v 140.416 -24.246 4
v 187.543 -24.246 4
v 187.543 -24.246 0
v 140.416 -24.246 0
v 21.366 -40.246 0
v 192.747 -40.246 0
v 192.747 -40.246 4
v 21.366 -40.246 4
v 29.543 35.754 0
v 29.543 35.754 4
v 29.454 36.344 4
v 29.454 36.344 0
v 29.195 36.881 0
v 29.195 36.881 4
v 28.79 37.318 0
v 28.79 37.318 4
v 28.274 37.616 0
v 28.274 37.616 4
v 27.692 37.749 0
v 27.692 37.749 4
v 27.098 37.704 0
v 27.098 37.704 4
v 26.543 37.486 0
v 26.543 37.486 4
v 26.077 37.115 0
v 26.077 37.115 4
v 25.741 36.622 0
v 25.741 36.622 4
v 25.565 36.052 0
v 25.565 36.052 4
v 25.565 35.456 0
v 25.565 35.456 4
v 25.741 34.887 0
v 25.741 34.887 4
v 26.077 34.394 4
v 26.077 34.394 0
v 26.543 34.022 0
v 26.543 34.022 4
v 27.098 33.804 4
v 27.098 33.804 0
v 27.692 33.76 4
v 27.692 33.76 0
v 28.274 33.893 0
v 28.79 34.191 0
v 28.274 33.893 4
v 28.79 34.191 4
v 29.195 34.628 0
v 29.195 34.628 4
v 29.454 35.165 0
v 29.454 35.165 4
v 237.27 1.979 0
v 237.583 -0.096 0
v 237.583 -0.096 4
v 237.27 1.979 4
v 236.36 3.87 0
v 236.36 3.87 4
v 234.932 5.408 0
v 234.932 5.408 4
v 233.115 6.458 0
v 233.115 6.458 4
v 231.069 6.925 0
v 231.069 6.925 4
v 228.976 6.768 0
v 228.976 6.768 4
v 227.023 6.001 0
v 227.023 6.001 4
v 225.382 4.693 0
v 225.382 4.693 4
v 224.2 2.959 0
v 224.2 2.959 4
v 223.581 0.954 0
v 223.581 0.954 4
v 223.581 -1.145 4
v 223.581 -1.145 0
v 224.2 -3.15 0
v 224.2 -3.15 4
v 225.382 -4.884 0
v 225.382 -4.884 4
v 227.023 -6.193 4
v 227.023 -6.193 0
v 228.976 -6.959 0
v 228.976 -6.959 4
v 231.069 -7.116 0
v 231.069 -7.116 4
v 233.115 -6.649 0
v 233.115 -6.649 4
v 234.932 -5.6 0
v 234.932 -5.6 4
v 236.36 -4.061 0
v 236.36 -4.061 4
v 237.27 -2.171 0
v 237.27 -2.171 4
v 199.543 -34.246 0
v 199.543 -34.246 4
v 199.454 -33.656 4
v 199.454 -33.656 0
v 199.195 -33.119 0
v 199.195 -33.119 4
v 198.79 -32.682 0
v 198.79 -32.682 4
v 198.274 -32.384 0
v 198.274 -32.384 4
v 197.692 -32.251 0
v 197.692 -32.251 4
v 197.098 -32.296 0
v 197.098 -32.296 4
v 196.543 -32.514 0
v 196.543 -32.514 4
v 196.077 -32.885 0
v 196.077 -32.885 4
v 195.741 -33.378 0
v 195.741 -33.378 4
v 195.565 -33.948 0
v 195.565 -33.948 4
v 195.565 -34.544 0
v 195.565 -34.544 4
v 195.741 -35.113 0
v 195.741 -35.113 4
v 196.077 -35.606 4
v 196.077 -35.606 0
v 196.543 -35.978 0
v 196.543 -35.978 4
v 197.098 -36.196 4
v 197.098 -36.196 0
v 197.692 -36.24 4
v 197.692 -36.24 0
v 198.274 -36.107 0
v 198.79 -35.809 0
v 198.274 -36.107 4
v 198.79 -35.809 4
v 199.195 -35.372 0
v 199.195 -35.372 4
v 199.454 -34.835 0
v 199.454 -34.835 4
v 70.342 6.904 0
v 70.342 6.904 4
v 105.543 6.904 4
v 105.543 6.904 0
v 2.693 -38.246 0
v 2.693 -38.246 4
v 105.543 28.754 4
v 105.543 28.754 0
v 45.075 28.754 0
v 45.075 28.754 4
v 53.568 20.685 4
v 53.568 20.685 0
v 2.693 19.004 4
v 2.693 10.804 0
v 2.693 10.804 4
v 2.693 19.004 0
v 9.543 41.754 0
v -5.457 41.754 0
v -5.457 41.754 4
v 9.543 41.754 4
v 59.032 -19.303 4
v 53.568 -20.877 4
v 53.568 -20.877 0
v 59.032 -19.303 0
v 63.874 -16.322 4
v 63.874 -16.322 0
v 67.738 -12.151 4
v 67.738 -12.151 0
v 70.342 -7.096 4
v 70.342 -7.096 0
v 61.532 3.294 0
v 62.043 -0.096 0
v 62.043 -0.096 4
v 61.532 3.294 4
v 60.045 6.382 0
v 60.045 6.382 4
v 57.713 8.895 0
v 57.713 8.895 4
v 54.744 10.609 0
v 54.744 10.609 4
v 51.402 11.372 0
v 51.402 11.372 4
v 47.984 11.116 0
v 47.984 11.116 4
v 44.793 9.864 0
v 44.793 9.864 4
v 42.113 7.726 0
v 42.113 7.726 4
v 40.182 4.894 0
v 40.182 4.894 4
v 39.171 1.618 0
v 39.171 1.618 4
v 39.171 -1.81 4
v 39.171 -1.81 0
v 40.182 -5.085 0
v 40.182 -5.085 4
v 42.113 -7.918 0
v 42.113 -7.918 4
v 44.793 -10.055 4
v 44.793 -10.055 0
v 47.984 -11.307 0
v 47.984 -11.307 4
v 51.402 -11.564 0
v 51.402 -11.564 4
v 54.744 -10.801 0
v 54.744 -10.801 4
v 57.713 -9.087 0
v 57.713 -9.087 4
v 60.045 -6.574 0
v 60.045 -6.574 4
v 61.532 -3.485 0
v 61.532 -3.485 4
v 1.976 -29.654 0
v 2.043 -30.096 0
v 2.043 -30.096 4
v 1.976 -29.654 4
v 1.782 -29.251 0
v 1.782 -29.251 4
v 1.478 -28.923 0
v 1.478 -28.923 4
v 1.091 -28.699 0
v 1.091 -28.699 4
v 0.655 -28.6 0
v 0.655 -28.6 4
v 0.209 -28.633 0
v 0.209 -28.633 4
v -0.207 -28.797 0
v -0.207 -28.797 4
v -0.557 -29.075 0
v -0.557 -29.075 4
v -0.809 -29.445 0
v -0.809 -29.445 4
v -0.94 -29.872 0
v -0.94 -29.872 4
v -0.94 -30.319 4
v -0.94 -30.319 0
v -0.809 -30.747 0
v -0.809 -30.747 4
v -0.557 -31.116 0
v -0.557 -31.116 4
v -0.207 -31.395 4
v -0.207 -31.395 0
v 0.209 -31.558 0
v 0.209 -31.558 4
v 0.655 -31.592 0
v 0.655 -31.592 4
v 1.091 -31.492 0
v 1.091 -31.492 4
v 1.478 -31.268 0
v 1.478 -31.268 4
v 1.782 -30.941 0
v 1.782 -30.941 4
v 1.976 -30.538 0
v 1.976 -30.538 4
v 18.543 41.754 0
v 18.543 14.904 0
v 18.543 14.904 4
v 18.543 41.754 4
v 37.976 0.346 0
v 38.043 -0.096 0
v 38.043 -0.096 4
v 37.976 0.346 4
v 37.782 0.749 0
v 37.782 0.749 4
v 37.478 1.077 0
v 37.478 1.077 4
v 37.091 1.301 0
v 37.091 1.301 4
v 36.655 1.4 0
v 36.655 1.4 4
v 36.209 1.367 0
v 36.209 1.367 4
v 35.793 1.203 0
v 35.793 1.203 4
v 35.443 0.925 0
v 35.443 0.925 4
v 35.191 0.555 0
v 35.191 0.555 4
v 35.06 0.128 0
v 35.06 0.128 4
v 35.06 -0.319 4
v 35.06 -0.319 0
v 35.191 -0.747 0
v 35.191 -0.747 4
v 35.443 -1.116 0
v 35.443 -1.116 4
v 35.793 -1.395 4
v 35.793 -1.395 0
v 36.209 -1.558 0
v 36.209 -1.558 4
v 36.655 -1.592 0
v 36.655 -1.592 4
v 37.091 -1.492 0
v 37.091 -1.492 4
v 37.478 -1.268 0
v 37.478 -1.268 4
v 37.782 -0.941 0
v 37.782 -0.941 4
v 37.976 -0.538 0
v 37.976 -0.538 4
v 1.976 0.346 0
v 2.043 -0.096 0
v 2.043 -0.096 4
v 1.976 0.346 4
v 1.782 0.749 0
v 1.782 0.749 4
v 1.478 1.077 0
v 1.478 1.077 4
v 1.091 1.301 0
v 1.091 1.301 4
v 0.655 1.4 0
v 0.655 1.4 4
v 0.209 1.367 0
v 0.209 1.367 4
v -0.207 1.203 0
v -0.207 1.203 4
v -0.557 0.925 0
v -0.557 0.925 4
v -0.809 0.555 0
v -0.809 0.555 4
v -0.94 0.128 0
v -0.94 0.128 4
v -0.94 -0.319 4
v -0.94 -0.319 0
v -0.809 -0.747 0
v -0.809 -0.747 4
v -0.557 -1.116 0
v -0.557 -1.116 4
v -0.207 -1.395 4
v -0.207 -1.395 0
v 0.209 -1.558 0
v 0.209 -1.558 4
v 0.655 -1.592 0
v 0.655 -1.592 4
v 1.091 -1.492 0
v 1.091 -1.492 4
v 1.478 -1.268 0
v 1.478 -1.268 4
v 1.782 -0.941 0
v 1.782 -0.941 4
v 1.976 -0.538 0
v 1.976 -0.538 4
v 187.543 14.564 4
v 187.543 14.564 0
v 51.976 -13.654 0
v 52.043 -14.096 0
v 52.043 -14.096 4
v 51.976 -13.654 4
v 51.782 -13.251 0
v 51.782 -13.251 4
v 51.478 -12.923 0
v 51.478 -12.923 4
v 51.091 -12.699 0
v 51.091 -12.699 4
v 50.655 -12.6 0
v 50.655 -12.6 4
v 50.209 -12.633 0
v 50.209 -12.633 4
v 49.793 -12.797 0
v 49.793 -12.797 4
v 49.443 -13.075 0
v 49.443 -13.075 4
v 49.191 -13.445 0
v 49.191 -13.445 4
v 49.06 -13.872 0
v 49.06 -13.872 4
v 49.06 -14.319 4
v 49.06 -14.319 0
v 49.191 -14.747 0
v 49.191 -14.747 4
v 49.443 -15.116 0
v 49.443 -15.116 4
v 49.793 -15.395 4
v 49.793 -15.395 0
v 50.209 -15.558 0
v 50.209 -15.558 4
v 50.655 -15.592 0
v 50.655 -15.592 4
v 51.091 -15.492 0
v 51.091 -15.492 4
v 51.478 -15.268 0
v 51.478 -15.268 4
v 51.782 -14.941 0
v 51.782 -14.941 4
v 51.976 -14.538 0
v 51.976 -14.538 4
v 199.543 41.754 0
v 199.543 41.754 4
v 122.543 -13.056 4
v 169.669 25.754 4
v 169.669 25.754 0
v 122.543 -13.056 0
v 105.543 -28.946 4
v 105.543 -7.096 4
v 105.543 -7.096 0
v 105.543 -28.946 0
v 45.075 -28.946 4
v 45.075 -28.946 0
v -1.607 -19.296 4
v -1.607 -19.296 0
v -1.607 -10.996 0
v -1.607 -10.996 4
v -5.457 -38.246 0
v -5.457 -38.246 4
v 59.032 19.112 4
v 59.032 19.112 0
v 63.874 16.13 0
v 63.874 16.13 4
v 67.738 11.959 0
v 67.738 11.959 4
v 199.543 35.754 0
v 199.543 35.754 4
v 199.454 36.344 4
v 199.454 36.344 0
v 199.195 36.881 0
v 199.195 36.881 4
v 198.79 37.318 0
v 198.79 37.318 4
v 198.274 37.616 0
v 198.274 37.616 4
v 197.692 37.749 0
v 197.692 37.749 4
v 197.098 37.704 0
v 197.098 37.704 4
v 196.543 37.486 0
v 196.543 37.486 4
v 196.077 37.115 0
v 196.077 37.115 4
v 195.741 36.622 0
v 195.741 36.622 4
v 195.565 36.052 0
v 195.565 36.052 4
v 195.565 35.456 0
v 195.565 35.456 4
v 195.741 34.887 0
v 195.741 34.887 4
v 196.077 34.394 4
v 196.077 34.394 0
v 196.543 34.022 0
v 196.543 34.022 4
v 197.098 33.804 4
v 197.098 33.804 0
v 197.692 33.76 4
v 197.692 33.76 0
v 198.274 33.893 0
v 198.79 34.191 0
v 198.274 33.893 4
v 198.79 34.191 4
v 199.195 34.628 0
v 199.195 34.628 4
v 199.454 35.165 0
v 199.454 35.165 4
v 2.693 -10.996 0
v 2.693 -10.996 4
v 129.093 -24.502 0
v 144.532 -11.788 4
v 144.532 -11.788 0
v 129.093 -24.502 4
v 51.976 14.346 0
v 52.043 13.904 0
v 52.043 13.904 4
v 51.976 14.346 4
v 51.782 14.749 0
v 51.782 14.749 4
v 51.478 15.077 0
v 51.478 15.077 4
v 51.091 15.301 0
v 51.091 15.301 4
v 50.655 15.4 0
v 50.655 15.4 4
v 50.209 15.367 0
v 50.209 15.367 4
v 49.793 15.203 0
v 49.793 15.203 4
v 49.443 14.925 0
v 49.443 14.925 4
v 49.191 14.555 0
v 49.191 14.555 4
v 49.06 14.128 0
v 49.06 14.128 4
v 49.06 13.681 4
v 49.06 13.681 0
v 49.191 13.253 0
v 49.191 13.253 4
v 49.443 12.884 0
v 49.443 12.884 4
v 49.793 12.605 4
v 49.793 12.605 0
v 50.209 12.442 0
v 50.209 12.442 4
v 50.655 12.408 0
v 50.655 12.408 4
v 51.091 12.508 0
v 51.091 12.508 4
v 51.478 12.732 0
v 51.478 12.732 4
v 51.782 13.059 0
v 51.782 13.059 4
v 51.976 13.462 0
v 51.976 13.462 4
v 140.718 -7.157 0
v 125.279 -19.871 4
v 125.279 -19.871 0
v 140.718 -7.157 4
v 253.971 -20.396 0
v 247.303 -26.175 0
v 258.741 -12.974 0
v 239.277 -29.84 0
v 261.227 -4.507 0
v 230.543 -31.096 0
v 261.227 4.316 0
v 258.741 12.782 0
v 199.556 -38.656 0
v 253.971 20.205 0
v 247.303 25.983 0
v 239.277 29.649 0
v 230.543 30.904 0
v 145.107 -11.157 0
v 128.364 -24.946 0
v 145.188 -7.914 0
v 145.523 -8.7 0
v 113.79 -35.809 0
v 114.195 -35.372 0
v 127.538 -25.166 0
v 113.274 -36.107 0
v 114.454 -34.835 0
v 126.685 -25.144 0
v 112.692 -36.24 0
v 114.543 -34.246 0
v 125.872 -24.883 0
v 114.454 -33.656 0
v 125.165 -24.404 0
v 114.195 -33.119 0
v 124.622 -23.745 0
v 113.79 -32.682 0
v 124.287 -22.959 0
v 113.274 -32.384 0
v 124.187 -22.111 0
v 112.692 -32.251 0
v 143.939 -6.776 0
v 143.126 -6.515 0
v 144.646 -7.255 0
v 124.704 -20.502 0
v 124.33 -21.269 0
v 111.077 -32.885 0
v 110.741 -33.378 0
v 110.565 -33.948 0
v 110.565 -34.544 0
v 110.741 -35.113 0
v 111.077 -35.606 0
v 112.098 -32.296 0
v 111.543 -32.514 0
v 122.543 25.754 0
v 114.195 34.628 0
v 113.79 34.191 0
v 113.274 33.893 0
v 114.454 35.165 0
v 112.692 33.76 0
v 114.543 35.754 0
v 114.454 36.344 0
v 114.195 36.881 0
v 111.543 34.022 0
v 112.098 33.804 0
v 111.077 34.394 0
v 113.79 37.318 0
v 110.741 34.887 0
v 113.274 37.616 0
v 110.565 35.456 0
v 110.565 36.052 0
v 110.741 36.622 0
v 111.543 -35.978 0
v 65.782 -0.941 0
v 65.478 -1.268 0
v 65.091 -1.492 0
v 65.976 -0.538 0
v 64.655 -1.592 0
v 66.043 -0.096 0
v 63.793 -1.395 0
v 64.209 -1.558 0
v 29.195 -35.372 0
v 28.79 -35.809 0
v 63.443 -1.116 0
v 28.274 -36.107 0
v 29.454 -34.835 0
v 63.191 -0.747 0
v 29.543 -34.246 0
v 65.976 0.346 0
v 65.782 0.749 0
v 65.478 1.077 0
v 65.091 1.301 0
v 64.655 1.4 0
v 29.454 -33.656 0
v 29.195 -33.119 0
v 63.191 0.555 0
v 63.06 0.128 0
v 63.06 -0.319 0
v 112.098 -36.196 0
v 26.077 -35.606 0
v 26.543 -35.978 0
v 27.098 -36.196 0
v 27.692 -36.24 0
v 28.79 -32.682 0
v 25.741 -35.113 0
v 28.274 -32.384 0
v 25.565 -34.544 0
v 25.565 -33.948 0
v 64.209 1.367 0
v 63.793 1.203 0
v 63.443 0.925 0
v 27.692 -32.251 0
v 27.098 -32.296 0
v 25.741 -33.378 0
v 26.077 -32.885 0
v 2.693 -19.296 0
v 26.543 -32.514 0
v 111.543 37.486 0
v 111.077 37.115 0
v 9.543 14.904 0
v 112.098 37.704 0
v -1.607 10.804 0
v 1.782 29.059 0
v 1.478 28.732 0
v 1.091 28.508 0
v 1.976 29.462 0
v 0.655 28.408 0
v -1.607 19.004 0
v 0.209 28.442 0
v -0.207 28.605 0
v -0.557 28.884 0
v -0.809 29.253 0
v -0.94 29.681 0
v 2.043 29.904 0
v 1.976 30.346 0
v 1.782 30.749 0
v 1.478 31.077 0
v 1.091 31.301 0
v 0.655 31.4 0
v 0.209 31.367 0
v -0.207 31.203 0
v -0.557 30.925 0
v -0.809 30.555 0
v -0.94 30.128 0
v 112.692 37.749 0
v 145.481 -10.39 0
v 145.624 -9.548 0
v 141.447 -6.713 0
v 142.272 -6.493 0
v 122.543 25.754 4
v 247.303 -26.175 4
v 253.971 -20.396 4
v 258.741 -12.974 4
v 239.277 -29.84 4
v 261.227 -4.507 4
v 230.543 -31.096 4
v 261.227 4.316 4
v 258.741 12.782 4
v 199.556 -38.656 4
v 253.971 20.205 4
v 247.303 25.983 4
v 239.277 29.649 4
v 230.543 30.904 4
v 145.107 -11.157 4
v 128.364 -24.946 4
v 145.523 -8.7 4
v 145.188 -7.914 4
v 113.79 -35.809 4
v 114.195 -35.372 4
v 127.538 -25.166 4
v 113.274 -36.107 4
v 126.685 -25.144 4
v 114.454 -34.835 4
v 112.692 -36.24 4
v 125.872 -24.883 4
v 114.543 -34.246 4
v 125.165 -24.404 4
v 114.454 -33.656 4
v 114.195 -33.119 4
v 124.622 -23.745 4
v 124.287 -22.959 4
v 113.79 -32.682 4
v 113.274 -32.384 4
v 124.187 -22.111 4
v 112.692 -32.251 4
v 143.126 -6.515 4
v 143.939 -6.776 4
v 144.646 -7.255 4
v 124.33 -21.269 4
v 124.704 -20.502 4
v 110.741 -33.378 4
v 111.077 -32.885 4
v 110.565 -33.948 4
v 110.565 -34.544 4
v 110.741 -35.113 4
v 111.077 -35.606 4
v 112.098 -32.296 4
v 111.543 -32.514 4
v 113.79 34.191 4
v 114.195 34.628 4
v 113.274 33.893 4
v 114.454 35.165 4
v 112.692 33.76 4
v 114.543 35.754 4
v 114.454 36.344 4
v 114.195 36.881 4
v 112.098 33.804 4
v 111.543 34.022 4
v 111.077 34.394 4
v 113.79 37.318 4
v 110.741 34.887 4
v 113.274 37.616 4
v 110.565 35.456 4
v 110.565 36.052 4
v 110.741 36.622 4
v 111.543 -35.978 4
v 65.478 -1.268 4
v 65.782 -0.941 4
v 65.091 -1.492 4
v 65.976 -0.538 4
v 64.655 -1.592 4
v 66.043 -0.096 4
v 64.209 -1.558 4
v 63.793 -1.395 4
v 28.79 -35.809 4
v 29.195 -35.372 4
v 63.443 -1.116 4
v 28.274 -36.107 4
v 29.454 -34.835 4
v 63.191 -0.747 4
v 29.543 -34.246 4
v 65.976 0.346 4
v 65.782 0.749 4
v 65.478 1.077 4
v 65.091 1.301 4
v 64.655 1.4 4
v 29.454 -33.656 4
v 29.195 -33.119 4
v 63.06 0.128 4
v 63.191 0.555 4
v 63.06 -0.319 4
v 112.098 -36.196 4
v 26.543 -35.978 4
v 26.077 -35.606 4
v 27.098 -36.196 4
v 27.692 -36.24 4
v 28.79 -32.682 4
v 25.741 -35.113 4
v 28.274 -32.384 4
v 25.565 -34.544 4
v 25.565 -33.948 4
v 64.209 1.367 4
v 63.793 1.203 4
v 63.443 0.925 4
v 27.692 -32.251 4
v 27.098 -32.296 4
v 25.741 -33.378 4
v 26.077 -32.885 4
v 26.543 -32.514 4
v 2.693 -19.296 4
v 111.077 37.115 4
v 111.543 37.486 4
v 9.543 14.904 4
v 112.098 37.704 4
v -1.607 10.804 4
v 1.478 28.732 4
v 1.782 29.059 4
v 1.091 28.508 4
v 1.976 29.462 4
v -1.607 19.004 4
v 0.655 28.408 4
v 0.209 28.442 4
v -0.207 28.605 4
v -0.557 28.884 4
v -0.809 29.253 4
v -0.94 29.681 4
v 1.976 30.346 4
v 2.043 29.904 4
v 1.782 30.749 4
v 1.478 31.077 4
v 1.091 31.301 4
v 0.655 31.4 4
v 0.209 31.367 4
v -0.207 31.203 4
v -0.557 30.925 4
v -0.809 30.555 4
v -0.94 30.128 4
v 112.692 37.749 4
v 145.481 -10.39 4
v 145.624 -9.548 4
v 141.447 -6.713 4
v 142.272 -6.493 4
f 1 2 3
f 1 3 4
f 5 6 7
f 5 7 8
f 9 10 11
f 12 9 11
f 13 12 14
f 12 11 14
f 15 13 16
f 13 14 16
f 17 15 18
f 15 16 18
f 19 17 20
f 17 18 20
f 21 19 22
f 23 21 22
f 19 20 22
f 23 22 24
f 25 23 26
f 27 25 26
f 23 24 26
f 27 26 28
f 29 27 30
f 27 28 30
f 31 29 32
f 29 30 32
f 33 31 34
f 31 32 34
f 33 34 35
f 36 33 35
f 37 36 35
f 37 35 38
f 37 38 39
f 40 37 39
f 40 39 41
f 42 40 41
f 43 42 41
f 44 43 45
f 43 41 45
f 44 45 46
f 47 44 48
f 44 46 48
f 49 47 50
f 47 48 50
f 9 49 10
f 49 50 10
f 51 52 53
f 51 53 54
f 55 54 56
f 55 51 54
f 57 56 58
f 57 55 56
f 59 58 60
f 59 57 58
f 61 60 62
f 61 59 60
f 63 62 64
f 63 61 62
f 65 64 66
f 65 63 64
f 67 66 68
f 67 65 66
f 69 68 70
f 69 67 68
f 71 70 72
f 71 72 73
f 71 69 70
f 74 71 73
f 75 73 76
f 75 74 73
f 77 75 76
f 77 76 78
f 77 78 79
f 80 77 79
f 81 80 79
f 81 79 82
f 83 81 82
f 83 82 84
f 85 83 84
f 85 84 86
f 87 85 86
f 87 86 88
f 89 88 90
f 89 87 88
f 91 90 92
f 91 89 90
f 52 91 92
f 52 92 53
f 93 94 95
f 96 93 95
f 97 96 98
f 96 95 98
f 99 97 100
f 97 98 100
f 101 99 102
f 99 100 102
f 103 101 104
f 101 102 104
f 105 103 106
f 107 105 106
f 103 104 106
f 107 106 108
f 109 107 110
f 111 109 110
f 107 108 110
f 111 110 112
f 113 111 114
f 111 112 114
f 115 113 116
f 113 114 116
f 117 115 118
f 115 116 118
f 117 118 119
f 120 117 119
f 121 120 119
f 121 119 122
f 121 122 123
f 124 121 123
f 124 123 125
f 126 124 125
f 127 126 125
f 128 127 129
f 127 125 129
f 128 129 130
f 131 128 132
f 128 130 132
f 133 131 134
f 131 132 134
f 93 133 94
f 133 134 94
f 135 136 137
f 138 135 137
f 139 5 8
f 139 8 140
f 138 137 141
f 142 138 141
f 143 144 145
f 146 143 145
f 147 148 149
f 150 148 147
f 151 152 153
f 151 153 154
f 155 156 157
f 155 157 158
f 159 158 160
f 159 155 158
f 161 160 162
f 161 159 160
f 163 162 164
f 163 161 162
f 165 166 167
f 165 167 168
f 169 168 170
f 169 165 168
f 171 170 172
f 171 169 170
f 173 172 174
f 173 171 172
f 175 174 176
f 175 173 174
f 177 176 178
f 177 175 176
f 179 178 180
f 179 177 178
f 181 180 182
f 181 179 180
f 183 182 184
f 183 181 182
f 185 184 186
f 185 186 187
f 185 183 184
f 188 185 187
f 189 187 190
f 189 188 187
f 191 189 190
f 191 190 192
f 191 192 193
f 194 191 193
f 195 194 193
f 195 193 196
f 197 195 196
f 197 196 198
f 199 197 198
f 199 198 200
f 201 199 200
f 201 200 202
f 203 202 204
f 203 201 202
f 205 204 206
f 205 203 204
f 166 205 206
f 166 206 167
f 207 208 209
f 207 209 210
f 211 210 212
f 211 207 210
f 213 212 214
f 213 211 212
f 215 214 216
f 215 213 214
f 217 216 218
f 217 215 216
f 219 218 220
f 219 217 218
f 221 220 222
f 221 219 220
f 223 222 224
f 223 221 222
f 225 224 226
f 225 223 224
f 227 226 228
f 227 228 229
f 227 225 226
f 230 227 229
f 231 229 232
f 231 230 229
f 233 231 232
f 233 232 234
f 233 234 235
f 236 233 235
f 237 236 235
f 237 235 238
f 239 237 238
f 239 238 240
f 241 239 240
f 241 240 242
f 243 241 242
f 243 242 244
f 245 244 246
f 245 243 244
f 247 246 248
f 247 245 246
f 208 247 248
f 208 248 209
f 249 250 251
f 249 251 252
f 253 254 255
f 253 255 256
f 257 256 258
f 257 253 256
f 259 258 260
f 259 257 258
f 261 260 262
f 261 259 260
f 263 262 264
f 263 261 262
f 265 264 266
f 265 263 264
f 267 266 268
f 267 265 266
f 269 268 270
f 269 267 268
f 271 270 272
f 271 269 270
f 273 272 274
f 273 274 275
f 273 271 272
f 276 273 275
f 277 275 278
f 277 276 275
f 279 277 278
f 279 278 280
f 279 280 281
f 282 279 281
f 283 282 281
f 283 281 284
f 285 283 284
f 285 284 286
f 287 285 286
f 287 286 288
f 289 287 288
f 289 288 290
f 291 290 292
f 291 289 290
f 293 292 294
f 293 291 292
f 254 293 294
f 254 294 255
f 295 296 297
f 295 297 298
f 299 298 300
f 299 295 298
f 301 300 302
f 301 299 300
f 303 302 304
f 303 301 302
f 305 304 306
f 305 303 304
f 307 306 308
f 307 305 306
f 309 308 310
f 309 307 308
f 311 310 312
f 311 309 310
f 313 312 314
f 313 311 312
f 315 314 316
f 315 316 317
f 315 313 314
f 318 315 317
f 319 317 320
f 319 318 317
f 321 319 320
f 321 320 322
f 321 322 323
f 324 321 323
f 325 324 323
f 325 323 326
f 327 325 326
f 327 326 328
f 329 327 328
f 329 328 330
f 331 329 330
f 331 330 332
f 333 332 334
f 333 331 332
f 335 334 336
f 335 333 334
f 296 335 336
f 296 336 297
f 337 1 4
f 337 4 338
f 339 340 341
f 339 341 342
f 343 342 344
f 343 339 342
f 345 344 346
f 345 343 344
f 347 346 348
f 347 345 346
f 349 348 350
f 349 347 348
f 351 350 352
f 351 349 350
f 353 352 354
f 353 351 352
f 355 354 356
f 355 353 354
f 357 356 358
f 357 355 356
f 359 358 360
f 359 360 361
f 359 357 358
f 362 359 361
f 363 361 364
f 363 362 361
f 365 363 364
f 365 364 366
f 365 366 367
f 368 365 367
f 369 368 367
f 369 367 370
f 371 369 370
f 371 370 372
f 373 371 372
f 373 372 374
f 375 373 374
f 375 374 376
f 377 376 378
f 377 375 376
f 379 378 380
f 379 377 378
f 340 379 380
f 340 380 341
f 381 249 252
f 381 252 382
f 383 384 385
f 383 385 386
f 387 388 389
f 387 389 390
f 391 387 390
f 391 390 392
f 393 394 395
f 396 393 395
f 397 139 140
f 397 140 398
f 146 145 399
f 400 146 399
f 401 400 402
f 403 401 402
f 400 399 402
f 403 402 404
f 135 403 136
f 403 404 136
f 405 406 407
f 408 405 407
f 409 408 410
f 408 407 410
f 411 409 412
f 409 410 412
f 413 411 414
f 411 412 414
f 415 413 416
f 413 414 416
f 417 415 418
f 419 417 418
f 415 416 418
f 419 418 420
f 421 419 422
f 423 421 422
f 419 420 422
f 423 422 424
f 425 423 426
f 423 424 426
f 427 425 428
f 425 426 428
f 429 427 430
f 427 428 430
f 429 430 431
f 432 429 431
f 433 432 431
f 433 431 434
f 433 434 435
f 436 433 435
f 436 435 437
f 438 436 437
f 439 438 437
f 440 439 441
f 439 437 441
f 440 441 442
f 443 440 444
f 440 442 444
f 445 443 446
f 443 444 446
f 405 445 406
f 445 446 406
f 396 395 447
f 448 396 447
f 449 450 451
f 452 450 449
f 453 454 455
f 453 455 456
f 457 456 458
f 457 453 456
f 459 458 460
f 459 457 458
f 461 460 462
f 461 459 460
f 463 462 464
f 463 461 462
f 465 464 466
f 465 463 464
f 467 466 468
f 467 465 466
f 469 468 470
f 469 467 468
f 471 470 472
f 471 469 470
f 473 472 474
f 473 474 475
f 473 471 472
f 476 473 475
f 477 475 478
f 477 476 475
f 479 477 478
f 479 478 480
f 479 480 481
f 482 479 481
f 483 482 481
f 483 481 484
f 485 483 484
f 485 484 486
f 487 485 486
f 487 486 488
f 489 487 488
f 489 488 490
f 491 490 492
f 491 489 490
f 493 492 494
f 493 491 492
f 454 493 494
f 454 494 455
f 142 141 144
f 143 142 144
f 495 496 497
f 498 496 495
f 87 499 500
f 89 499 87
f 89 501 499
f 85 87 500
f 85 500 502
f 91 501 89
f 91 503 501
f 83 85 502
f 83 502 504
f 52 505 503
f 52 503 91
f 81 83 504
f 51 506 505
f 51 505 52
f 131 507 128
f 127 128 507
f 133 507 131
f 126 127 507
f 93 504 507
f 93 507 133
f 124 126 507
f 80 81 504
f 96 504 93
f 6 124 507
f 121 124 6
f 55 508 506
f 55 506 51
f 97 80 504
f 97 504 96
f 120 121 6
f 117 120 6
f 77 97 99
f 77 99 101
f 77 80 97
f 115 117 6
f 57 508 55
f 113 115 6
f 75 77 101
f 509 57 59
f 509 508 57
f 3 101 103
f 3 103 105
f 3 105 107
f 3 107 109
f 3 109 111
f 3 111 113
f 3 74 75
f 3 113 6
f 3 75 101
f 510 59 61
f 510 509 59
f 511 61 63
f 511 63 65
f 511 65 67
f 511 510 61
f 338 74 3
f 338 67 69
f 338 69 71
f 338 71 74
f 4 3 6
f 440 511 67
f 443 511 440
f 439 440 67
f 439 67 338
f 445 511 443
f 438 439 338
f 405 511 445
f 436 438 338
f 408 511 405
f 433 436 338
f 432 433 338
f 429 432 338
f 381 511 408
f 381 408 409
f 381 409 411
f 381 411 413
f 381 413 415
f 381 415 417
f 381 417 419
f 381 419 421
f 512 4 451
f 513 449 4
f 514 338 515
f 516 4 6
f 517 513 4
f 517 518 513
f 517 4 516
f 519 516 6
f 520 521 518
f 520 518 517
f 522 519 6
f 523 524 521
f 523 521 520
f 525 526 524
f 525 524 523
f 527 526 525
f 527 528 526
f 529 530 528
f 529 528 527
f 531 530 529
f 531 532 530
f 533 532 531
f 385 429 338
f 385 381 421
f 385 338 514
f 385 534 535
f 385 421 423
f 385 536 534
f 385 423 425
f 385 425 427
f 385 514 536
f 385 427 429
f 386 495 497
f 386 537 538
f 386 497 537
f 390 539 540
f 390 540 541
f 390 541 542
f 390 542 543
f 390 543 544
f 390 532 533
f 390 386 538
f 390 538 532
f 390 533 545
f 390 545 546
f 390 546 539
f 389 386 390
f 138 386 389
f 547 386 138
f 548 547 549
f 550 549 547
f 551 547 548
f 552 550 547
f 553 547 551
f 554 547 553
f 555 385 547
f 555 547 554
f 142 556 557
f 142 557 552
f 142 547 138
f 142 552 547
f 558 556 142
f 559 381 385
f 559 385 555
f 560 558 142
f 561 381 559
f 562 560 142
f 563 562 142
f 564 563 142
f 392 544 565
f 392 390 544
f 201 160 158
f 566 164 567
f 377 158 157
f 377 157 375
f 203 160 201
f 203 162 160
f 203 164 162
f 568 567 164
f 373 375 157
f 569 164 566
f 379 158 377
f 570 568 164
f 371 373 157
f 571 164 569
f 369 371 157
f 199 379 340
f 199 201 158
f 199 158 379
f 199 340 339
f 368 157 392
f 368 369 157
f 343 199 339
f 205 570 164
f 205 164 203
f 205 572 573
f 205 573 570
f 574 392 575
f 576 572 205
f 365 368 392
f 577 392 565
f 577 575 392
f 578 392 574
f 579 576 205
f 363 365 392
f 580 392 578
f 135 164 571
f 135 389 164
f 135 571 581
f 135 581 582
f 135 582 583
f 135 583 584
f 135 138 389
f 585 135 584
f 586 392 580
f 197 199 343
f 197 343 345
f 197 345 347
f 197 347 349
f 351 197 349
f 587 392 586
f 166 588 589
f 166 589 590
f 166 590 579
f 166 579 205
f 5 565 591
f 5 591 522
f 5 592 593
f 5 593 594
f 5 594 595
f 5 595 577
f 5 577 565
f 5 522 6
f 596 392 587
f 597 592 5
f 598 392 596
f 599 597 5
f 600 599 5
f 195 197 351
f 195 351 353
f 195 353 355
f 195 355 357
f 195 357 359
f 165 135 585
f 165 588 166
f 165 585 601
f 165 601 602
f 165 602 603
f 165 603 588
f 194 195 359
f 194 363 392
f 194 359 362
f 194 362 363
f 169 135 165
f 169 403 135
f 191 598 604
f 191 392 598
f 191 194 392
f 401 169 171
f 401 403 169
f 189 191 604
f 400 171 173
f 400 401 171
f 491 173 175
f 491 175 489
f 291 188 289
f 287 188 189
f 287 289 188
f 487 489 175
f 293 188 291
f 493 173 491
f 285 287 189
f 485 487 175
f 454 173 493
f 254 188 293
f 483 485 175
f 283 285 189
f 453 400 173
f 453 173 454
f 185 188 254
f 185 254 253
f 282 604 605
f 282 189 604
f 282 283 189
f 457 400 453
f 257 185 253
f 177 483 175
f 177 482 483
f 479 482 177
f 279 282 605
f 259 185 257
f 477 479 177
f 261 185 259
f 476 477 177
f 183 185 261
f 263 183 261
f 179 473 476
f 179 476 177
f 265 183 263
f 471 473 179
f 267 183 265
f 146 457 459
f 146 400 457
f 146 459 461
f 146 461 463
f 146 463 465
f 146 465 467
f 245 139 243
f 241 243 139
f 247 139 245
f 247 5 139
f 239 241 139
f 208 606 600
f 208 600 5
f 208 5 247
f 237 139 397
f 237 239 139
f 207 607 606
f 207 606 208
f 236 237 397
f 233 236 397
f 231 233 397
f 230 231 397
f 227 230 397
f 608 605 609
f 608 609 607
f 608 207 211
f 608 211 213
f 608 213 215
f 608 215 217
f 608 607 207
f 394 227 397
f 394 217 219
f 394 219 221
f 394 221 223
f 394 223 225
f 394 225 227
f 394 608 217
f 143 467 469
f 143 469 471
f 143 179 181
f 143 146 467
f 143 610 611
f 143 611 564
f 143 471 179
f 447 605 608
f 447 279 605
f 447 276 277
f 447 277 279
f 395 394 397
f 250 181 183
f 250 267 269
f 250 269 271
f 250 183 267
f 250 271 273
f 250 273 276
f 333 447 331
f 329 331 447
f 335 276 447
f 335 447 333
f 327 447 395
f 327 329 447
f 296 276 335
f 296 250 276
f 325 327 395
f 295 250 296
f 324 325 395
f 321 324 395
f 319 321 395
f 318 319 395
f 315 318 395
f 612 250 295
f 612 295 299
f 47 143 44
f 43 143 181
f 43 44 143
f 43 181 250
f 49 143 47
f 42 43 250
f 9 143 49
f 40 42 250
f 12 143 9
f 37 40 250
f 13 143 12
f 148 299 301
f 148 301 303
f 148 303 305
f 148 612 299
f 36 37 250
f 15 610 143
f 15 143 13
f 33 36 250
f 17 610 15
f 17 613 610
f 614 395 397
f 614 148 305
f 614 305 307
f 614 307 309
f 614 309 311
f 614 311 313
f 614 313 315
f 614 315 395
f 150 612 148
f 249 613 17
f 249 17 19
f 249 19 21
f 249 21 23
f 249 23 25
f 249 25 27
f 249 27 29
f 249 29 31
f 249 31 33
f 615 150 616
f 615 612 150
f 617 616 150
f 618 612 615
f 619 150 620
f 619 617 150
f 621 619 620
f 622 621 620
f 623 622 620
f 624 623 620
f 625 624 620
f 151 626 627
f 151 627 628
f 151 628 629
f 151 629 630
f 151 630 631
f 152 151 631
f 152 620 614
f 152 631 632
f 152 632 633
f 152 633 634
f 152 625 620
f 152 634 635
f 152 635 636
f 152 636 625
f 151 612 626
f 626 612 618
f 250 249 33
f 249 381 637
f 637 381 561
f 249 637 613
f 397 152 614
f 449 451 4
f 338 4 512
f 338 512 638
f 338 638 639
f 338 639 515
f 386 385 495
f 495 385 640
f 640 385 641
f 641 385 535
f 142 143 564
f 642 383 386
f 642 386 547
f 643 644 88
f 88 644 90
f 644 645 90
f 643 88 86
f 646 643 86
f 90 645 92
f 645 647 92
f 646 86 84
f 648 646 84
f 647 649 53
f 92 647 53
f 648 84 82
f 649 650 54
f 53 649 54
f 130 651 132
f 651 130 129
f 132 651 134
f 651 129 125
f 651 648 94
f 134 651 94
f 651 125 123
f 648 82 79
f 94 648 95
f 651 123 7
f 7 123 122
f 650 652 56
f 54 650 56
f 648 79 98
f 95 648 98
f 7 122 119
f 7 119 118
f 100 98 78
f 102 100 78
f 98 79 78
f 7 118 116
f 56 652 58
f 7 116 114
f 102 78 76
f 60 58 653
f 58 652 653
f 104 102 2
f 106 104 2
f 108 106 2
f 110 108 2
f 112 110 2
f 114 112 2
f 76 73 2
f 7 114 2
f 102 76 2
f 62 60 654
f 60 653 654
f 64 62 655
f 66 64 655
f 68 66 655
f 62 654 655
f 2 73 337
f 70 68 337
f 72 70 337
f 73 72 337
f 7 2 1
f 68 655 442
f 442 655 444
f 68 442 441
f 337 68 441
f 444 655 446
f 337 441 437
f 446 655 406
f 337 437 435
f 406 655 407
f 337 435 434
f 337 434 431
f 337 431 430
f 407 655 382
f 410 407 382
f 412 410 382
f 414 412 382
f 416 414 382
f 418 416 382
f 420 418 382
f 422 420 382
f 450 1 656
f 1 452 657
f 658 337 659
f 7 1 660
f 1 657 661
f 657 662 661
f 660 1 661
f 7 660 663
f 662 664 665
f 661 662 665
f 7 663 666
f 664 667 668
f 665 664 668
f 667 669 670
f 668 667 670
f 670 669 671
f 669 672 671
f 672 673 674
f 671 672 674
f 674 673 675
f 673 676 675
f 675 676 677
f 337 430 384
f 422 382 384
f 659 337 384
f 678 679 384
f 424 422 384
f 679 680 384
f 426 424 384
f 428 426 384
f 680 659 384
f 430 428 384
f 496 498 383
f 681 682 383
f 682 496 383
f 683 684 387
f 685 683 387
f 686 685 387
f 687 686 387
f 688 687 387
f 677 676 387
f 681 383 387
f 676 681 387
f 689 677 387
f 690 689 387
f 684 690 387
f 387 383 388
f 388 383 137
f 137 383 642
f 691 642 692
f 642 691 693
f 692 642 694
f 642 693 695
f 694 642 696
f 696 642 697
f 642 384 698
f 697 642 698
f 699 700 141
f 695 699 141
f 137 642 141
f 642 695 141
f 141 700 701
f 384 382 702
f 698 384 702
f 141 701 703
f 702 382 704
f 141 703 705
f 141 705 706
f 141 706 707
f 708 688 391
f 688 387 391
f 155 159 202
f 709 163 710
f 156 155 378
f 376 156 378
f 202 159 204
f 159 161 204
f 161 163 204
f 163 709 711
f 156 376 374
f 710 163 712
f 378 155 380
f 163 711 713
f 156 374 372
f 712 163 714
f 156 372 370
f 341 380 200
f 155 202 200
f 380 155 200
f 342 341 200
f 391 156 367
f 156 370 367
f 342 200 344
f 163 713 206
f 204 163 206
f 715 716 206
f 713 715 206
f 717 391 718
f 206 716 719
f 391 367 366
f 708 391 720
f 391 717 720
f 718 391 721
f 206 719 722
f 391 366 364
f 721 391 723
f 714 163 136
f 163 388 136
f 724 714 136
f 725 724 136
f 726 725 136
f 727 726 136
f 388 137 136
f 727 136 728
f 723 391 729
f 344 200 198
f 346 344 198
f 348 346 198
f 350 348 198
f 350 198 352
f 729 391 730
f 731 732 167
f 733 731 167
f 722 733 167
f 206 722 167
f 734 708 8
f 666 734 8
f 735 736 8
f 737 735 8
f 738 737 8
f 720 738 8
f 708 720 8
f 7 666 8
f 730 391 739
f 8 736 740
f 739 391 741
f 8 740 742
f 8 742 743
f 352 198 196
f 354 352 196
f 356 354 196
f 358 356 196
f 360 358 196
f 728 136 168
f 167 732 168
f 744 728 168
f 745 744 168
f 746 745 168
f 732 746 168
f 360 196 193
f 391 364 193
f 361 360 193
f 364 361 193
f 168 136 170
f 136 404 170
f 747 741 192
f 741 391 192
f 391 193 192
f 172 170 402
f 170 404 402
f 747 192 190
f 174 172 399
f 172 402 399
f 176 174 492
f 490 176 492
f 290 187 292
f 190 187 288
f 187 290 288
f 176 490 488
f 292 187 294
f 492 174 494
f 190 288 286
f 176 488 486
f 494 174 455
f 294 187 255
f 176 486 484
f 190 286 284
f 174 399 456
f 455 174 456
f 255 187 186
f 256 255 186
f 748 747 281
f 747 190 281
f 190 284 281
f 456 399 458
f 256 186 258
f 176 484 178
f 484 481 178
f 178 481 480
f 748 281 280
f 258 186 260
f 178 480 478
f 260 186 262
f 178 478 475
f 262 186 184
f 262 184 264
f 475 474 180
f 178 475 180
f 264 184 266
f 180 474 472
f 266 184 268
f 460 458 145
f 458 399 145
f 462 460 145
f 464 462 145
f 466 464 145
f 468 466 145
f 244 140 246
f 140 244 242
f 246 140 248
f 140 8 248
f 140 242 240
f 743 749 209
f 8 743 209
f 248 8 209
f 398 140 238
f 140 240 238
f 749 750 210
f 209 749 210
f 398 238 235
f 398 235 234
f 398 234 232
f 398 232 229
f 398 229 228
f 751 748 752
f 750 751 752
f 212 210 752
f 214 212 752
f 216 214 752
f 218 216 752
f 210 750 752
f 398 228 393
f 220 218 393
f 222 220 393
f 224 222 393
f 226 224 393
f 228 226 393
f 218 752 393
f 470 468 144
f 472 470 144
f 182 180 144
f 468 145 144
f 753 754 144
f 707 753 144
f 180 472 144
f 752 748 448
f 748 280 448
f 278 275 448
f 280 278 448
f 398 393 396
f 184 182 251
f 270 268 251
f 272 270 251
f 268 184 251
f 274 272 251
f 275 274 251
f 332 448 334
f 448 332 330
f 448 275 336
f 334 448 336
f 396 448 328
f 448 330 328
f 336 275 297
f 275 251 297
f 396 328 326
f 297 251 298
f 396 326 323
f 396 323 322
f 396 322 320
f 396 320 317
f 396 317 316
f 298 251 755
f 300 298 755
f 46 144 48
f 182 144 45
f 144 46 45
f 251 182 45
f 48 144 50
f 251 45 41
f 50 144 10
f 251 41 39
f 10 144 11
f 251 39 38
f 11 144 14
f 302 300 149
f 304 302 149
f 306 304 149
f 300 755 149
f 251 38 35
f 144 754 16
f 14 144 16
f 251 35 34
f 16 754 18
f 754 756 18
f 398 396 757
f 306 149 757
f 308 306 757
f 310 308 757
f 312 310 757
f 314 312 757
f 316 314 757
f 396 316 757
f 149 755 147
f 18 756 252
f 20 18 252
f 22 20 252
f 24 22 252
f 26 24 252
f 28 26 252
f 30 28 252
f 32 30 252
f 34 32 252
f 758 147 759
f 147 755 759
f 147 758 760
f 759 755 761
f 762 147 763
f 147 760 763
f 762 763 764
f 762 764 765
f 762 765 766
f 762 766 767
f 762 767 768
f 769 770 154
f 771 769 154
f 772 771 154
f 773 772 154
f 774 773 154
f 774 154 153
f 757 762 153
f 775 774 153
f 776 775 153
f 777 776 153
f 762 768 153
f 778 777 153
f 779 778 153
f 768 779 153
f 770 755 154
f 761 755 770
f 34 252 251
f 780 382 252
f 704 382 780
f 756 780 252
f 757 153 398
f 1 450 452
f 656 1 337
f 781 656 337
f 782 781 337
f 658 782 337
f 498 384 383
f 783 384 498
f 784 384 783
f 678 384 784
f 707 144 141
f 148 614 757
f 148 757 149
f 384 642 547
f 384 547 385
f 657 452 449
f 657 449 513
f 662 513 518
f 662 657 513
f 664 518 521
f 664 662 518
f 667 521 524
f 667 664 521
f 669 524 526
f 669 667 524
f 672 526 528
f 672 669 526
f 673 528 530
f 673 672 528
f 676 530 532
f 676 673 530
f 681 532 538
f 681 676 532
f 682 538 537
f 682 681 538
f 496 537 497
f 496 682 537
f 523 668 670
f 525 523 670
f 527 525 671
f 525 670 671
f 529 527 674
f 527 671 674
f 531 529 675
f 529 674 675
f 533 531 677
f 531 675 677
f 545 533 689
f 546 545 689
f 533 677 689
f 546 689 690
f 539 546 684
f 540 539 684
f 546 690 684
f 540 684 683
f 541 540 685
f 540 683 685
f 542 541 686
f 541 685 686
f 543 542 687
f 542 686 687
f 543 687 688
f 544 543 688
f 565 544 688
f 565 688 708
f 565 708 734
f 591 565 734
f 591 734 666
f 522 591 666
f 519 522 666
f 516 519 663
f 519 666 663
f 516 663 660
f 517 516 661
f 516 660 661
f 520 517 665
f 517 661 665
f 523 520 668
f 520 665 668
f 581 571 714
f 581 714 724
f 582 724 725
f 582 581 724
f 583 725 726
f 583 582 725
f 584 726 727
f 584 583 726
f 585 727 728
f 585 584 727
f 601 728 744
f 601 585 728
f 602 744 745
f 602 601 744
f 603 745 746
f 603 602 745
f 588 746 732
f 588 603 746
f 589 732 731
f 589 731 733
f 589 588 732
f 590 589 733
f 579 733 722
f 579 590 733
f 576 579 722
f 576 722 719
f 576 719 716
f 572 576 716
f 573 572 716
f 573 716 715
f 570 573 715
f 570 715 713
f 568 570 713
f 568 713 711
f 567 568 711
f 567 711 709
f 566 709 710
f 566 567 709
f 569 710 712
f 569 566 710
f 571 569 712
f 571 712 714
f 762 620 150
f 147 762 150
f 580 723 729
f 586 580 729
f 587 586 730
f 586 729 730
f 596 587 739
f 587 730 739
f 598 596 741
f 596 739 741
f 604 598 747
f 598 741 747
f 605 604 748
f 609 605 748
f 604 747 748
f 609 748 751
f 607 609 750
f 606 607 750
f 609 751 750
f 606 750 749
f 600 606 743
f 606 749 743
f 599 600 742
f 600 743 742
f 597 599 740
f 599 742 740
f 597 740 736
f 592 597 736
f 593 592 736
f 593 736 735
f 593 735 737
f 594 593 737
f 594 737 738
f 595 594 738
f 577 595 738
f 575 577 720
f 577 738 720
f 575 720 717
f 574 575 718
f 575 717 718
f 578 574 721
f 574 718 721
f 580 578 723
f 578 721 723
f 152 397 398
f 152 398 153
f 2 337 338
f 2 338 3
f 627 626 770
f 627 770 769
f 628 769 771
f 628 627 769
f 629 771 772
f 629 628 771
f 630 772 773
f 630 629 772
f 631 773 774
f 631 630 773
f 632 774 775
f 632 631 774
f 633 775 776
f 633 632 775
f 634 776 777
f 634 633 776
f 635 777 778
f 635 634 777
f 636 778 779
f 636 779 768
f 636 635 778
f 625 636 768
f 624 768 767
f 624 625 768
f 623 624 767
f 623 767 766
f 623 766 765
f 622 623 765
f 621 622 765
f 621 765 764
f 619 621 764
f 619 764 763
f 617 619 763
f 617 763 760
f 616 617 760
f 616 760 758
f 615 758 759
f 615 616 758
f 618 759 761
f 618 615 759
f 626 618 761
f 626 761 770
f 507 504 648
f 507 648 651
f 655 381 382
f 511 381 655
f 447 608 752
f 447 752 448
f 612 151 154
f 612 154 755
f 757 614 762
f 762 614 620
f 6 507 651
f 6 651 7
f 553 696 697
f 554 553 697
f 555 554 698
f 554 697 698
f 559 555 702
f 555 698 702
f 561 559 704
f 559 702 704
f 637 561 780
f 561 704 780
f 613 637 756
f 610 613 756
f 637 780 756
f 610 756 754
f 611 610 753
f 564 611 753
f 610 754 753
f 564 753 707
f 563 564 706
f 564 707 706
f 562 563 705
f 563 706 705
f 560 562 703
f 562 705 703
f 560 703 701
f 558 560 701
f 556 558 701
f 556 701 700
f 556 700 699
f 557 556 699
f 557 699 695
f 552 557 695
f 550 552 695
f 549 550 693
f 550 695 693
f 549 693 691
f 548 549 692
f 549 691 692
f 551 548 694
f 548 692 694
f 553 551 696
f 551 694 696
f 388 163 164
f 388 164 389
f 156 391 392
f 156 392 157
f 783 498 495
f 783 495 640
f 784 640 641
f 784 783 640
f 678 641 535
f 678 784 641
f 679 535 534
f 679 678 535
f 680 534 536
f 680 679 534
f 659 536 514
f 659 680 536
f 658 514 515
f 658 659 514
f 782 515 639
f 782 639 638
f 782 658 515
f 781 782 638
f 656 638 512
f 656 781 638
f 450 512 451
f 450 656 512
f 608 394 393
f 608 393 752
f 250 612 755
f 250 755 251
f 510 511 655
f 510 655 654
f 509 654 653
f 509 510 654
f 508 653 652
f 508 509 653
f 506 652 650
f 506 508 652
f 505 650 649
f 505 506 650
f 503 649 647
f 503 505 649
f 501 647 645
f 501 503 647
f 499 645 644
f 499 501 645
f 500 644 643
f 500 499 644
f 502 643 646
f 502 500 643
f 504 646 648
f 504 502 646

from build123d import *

# Parameters (mm, degrees)
SKETCH_1_R          = 1.5
SKETCH_1_R_2        = 11.5
SKETCH_1_R_3        = 7.04
SKETCH_1_W          = 4.3
SKETCH_1_H          = 8.2
SKETCH_1_H_2        = 8.3
EXTRUDE_1_DEPTH     = 4
SKETCH_2_R          = 2
CUT_EXTRUDE_1_DEPTH = 4


with BuildPart() as part:
    # 草图1 → 凸台-拉伸1 (new body)
    with BuildSketch(Plane.XY):
        with BuildLine():
            Line((-5.457142857, -0.095714286), (-5.457142857, 41.754285714))
            Line((-5.457142857, 41.754285714), (9.542857143, 41.754285714))
            Line((9.542857143, 41.754285714), (9.542857143, 14.904285714))
            Line((9.542857143, 14.904285714), (18.542857143, 14.904285714))
            Line((18.542857143, 14.904285714), (18.542857143, 41.754285714))
            Line((18.542857143, 41.754285714), (199.542857143, 41.754285714))
            Line((199.542857143, 41.754285714), (230.542857143, 30.904285714))
            ThreePointArc((230.542857143, 30.904285714), (261.542857143, -0.095714286), (230.542857143, -31.095714286))
            Line((230.542857143, -31.095714286), (199.556073527, -38.65591431))
            Line((199.556073527, -38.65591431), (192.746868021, -40.245714286))
            Line((192.746868021, -40.245714286), (21.365844759, -40.245714286))
            Line((21.365844759, -40.245714286), (2.692857143, -38.245714286))
            Line((2.692857143, -38.245714286), (-5.457142857, -38.245714286))
            Line((-5.457142857, -38.245714286), (-5.457142857, -0.095714286))
        make_face()
        with Locations((0.542857143, 29.904285714)):
            Circle(SKETCH_1_R, mode=Mode.SUBTRACT)
        with Locations((0.542857143, -0.095714286)):
            Circle(SKETCH_1_R, mode=Mode.SUBTRACT)
        with Locations((0.542857143, -30.095714286)):
            Circle(SKETCH_1_R, mode=Mode.SUBTRACT)
        with Locations((50.542857143, -0.095714286)):
            Circle(SKETCH_1_R_2, mode=Mode.SUBTRACT)
        with Locations((50.542857143, -14.095714286)):
            Circle(SKETCH_1_R, mode=Mode.SUBTRACT)
        with Locations((36.542857143, -0.095714286)):
            Circle(SKETCH_1_R, mode=Mode.SUBTRACT)
        with Locations((50.542857143, 13.904285714)):
            Circle(SKETCH_1_R, mode=Mode.SUBTRACT)
        with Locations((64.542857143, -0.095714286)):
            Circle(SKETCH_1_R, mode=Mode.SUBTRACT)
        with Locations((230.542857143, -0.095714286)):
            Circle(SKETCH_1_R_3, mode=Mode.SUBTRACT)
        with Locations((0.542857143, 14.904285714)):
            Rectangle(SKETCH_1_W, SKETCH_1_H, mode=Mode.SUBTRACT)
        with Locations((0.542857143, -15.145714286)):
            Rectangle(SKETCH_1_W, SKETCH_1_H_2, mode=Mode.SUBTRACT)
    extrude(amount=EXTRUDE_1_DEPTH)

    # 草图2 → 切除-拉伸1 (cut)
    with BuildSketch(Plane.XY.offset(4)):
        with Locations((27.542857143, 35.754285714)):
            Circle(SKETCH_2_R)
        with Locations((112.542857143, 35.754285714)):
            Circle(SKETCH_2_R)
        with Locations((197.542857143, 35.754285714)):
            Circle(SKETCH_2_R)
        with Locations((112.542857143, -34.245714286)):
            Circle(SKETCH_2_R)
        with Locations((197.542857143, -34.245714286)):
            Circle(SKETCH_2_R)
        with Locations((27.542857143, -34.245714286)):
            Circle(SKETCH_2_R)
        Polygon((187.542857143, -24.245714286), (140.41622539, -24.245714286), (187.542857143, 14.56445304), align=None)
        Polygon((122.542857143, 25.754285714), (169.669488896, 25.754285714), (122.542857143, -13.055881612), align=None)
        with BuildLine():
            Line((70.341847016, 6.904285714), (105.542857143, 6.904285714))
            Line((105.542857143, 6.904285714), (105.542857143, 28.754285714))
            Line((105.542857143, 28.754285714), (45.074625519, 28.754285714))
            Line((45.074625519, 28.754285714), (53.568409163, 20.685191252))
            ThreePointArc((53.568409163, 20.685191252), (63.873958655, 16.130244314), (70.341847016, 6.904285714))
        make_face()
        with BuildLine():
            Line((105.542857143, -7.095714286), (105.542857143, -28.945714286))
            Line((105.542857143, -28.945714286), (45.074625519, -28.945714286))
            Line((45.074625519, -28.945714286), (53.568409163, -20.876619824))
            ThreePointArc((53.568409163, -20.876619824), (63.873958655, -16.321672885), (70.341847016, -7.095714286))
            Line((70.341847016, -7.095714286), (105.542857143, -7.095714286))
        make_face()
        with BuildLine():
            Line((125.279005787, -19.870759717), (140.7176105, -7.15661466))
            ThreePointArc((140.7176105, -7.15661466), (144.940522965, -7.565283608), (144.531854017, -11.788196074))
            Line((144.531854017, -11.788196074), (129.093249305, -24.502341131))
            ThreePointArc((129.093249305, -24.502341131), (124.870336839, -24.093672183), (125.279005787, -19.870759717))
        make_face()
    extrude(amount=-CUT_EXTRUDE_1_DEPTH, mode=Mode.SUBTRACT)


solid = part.part
